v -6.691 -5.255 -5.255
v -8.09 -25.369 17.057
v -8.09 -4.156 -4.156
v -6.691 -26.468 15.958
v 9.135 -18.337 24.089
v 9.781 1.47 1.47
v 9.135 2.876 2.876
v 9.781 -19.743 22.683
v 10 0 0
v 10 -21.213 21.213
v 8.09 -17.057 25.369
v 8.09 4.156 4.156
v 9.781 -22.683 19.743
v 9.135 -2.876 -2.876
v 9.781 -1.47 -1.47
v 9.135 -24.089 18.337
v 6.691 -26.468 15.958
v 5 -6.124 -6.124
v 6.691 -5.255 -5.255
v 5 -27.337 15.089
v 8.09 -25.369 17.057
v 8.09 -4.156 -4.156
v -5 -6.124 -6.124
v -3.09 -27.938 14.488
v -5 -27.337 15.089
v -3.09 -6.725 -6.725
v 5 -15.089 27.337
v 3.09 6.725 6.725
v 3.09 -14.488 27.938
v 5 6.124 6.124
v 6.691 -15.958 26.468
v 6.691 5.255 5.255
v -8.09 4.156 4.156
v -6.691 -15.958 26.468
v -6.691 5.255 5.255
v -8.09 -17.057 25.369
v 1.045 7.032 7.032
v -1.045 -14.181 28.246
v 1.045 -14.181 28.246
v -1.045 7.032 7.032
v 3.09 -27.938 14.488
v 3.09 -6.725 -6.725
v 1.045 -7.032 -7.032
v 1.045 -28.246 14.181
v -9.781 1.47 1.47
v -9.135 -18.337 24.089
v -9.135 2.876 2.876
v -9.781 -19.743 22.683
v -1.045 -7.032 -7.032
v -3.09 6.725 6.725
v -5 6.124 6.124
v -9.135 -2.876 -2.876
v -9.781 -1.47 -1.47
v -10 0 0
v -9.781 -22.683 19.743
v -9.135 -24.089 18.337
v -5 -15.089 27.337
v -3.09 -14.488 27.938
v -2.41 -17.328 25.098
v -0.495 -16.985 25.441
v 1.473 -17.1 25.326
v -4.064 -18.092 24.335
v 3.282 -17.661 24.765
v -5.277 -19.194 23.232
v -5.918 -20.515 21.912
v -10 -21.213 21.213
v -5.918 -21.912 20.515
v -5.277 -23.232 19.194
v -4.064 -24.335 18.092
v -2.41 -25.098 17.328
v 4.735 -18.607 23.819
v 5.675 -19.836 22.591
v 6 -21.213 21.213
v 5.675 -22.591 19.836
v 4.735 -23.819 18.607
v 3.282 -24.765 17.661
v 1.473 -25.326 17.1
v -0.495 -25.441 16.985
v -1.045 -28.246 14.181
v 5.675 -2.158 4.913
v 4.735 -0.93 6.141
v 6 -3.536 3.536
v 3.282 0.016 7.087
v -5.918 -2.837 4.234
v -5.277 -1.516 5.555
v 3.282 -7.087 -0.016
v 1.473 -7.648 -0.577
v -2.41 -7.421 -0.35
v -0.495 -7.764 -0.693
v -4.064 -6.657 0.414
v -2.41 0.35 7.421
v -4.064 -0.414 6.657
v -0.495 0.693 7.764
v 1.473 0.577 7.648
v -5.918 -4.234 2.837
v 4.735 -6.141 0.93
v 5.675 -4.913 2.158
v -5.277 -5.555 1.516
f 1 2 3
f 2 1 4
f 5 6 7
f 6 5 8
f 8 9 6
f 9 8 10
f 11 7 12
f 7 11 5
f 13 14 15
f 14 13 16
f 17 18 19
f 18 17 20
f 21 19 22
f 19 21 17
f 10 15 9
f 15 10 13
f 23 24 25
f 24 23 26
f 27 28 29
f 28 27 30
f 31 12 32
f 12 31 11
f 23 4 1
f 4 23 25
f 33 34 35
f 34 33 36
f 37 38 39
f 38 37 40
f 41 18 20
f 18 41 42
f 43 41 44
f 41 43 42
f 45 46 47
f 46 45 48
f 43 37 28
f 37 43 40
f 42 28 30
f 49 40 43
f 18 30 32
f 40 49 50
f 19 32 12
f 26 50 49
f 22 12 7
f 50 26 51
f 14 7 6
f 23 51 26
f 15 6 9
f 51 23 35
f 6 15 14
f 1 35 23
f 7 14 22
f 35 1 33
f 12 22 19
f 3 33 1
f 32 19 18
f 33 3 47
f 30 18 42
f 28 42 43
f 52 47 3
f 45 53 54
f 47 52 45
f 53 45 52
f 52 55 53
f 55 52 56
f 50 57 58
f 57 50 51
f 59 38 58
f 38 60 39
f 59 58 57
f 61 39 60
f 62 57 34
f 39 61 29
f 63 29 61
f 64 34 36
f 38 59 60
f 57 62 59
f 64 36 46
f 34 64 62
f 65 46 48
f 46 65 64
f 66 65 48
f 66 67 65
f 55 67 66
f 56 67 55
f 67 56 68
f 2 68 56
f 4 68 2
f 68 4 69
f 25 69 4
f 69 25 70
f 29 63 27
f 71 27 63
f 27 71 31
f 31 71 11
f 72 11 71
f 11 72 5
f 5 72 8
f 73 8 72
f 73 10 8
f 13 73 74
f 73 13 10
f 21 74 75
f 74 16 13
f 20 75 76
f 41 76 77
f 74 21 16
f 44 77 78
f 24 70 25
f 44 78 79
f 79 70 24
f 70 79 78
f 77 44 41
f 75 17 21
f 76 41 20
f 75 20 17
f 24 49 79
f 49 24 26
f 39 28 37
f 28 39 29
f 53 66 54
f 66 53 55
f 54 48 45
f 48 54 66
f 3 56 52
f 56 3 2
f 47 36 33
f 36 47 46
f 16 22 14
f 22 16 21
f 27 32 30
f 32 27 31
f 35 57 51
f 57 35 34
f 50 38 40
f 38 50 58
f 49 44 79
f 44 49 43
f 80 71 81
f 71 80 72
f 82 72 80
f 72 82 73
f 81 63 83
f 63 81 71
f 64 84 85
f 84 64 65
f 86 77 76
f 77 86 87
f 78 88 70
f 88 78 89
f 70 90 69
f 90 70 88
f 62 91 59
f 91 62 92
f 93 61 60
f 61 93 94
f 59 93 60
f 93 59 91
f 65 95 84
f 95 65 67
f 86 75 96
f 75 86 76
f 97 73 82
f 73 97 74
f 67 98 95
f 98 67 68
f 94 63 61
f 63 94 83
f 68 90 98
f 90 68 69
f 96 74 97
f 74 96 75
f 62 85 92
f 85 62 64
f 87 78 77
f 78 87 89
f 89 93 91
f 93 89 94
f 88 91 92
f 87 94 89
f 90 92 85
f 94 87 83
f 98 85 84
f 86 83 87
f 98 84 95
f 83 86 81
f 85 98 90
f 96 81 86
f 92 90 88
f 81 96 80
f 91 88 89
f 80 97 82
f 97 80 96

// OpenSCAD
rotate([45, 0, 0]) difference() {
    cylinder(h = 30, r = 10);
    translate([0, 0, 5]) cylinder(h = 30, r = 6);
}
